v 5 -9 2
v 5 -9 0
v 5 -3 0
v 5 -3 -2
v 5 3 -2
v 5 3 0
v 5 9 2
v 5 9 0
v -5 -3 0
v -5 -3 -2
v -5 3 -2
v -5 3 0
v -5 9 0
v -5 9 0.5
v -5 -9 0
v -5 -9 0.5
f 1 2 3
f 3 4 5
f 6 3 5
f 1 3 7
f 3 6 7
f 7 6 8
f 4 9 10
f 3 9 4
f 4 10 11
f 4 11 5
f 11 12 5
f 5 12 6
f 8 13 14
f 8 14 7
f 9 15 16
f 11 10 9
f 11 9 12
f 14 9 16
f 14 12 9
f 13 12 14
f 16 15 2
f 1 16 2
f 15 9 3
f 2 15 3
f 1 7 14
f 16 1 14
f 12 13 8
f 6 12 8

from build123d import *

# Parameters (mm, degrees)
F0_W     = 10
F0_H     = 18
F1_DEPTH = 4
F3_DEPTH = 18.001
F4_W     = 10
F4_H     = 6
F5_DEPTH = 2


with BuildPart() as f1:
    # F0 (on Top) → F1 (new body)
    with BuildSketch(Plane.XY):
        Rectangle(F0_W, F0_H)
    extrude(amount=F1_DEPTH)

    # F2 (on face) → F3 (intersect, through all)
    with BuildSketch(Plane.XZ.offset(9)):
        Polygon((5, 2), (-5, 0.5), (-5, 0), (5, 0), align=None)
    extrude(amount=-F3_DEPTH, mode=Mode.INTERSECT)

    # F4 (on face) → F5 (join)
    with BuildSketch(Plane(origin=(0, 0, 0), x_dir=(1, 0, 0), z_dir=(0, 0, -1))):
        Rectangle(F4_W, F4_H)
    extrude(amount=F5_DEPTH)


solid = f1.part
